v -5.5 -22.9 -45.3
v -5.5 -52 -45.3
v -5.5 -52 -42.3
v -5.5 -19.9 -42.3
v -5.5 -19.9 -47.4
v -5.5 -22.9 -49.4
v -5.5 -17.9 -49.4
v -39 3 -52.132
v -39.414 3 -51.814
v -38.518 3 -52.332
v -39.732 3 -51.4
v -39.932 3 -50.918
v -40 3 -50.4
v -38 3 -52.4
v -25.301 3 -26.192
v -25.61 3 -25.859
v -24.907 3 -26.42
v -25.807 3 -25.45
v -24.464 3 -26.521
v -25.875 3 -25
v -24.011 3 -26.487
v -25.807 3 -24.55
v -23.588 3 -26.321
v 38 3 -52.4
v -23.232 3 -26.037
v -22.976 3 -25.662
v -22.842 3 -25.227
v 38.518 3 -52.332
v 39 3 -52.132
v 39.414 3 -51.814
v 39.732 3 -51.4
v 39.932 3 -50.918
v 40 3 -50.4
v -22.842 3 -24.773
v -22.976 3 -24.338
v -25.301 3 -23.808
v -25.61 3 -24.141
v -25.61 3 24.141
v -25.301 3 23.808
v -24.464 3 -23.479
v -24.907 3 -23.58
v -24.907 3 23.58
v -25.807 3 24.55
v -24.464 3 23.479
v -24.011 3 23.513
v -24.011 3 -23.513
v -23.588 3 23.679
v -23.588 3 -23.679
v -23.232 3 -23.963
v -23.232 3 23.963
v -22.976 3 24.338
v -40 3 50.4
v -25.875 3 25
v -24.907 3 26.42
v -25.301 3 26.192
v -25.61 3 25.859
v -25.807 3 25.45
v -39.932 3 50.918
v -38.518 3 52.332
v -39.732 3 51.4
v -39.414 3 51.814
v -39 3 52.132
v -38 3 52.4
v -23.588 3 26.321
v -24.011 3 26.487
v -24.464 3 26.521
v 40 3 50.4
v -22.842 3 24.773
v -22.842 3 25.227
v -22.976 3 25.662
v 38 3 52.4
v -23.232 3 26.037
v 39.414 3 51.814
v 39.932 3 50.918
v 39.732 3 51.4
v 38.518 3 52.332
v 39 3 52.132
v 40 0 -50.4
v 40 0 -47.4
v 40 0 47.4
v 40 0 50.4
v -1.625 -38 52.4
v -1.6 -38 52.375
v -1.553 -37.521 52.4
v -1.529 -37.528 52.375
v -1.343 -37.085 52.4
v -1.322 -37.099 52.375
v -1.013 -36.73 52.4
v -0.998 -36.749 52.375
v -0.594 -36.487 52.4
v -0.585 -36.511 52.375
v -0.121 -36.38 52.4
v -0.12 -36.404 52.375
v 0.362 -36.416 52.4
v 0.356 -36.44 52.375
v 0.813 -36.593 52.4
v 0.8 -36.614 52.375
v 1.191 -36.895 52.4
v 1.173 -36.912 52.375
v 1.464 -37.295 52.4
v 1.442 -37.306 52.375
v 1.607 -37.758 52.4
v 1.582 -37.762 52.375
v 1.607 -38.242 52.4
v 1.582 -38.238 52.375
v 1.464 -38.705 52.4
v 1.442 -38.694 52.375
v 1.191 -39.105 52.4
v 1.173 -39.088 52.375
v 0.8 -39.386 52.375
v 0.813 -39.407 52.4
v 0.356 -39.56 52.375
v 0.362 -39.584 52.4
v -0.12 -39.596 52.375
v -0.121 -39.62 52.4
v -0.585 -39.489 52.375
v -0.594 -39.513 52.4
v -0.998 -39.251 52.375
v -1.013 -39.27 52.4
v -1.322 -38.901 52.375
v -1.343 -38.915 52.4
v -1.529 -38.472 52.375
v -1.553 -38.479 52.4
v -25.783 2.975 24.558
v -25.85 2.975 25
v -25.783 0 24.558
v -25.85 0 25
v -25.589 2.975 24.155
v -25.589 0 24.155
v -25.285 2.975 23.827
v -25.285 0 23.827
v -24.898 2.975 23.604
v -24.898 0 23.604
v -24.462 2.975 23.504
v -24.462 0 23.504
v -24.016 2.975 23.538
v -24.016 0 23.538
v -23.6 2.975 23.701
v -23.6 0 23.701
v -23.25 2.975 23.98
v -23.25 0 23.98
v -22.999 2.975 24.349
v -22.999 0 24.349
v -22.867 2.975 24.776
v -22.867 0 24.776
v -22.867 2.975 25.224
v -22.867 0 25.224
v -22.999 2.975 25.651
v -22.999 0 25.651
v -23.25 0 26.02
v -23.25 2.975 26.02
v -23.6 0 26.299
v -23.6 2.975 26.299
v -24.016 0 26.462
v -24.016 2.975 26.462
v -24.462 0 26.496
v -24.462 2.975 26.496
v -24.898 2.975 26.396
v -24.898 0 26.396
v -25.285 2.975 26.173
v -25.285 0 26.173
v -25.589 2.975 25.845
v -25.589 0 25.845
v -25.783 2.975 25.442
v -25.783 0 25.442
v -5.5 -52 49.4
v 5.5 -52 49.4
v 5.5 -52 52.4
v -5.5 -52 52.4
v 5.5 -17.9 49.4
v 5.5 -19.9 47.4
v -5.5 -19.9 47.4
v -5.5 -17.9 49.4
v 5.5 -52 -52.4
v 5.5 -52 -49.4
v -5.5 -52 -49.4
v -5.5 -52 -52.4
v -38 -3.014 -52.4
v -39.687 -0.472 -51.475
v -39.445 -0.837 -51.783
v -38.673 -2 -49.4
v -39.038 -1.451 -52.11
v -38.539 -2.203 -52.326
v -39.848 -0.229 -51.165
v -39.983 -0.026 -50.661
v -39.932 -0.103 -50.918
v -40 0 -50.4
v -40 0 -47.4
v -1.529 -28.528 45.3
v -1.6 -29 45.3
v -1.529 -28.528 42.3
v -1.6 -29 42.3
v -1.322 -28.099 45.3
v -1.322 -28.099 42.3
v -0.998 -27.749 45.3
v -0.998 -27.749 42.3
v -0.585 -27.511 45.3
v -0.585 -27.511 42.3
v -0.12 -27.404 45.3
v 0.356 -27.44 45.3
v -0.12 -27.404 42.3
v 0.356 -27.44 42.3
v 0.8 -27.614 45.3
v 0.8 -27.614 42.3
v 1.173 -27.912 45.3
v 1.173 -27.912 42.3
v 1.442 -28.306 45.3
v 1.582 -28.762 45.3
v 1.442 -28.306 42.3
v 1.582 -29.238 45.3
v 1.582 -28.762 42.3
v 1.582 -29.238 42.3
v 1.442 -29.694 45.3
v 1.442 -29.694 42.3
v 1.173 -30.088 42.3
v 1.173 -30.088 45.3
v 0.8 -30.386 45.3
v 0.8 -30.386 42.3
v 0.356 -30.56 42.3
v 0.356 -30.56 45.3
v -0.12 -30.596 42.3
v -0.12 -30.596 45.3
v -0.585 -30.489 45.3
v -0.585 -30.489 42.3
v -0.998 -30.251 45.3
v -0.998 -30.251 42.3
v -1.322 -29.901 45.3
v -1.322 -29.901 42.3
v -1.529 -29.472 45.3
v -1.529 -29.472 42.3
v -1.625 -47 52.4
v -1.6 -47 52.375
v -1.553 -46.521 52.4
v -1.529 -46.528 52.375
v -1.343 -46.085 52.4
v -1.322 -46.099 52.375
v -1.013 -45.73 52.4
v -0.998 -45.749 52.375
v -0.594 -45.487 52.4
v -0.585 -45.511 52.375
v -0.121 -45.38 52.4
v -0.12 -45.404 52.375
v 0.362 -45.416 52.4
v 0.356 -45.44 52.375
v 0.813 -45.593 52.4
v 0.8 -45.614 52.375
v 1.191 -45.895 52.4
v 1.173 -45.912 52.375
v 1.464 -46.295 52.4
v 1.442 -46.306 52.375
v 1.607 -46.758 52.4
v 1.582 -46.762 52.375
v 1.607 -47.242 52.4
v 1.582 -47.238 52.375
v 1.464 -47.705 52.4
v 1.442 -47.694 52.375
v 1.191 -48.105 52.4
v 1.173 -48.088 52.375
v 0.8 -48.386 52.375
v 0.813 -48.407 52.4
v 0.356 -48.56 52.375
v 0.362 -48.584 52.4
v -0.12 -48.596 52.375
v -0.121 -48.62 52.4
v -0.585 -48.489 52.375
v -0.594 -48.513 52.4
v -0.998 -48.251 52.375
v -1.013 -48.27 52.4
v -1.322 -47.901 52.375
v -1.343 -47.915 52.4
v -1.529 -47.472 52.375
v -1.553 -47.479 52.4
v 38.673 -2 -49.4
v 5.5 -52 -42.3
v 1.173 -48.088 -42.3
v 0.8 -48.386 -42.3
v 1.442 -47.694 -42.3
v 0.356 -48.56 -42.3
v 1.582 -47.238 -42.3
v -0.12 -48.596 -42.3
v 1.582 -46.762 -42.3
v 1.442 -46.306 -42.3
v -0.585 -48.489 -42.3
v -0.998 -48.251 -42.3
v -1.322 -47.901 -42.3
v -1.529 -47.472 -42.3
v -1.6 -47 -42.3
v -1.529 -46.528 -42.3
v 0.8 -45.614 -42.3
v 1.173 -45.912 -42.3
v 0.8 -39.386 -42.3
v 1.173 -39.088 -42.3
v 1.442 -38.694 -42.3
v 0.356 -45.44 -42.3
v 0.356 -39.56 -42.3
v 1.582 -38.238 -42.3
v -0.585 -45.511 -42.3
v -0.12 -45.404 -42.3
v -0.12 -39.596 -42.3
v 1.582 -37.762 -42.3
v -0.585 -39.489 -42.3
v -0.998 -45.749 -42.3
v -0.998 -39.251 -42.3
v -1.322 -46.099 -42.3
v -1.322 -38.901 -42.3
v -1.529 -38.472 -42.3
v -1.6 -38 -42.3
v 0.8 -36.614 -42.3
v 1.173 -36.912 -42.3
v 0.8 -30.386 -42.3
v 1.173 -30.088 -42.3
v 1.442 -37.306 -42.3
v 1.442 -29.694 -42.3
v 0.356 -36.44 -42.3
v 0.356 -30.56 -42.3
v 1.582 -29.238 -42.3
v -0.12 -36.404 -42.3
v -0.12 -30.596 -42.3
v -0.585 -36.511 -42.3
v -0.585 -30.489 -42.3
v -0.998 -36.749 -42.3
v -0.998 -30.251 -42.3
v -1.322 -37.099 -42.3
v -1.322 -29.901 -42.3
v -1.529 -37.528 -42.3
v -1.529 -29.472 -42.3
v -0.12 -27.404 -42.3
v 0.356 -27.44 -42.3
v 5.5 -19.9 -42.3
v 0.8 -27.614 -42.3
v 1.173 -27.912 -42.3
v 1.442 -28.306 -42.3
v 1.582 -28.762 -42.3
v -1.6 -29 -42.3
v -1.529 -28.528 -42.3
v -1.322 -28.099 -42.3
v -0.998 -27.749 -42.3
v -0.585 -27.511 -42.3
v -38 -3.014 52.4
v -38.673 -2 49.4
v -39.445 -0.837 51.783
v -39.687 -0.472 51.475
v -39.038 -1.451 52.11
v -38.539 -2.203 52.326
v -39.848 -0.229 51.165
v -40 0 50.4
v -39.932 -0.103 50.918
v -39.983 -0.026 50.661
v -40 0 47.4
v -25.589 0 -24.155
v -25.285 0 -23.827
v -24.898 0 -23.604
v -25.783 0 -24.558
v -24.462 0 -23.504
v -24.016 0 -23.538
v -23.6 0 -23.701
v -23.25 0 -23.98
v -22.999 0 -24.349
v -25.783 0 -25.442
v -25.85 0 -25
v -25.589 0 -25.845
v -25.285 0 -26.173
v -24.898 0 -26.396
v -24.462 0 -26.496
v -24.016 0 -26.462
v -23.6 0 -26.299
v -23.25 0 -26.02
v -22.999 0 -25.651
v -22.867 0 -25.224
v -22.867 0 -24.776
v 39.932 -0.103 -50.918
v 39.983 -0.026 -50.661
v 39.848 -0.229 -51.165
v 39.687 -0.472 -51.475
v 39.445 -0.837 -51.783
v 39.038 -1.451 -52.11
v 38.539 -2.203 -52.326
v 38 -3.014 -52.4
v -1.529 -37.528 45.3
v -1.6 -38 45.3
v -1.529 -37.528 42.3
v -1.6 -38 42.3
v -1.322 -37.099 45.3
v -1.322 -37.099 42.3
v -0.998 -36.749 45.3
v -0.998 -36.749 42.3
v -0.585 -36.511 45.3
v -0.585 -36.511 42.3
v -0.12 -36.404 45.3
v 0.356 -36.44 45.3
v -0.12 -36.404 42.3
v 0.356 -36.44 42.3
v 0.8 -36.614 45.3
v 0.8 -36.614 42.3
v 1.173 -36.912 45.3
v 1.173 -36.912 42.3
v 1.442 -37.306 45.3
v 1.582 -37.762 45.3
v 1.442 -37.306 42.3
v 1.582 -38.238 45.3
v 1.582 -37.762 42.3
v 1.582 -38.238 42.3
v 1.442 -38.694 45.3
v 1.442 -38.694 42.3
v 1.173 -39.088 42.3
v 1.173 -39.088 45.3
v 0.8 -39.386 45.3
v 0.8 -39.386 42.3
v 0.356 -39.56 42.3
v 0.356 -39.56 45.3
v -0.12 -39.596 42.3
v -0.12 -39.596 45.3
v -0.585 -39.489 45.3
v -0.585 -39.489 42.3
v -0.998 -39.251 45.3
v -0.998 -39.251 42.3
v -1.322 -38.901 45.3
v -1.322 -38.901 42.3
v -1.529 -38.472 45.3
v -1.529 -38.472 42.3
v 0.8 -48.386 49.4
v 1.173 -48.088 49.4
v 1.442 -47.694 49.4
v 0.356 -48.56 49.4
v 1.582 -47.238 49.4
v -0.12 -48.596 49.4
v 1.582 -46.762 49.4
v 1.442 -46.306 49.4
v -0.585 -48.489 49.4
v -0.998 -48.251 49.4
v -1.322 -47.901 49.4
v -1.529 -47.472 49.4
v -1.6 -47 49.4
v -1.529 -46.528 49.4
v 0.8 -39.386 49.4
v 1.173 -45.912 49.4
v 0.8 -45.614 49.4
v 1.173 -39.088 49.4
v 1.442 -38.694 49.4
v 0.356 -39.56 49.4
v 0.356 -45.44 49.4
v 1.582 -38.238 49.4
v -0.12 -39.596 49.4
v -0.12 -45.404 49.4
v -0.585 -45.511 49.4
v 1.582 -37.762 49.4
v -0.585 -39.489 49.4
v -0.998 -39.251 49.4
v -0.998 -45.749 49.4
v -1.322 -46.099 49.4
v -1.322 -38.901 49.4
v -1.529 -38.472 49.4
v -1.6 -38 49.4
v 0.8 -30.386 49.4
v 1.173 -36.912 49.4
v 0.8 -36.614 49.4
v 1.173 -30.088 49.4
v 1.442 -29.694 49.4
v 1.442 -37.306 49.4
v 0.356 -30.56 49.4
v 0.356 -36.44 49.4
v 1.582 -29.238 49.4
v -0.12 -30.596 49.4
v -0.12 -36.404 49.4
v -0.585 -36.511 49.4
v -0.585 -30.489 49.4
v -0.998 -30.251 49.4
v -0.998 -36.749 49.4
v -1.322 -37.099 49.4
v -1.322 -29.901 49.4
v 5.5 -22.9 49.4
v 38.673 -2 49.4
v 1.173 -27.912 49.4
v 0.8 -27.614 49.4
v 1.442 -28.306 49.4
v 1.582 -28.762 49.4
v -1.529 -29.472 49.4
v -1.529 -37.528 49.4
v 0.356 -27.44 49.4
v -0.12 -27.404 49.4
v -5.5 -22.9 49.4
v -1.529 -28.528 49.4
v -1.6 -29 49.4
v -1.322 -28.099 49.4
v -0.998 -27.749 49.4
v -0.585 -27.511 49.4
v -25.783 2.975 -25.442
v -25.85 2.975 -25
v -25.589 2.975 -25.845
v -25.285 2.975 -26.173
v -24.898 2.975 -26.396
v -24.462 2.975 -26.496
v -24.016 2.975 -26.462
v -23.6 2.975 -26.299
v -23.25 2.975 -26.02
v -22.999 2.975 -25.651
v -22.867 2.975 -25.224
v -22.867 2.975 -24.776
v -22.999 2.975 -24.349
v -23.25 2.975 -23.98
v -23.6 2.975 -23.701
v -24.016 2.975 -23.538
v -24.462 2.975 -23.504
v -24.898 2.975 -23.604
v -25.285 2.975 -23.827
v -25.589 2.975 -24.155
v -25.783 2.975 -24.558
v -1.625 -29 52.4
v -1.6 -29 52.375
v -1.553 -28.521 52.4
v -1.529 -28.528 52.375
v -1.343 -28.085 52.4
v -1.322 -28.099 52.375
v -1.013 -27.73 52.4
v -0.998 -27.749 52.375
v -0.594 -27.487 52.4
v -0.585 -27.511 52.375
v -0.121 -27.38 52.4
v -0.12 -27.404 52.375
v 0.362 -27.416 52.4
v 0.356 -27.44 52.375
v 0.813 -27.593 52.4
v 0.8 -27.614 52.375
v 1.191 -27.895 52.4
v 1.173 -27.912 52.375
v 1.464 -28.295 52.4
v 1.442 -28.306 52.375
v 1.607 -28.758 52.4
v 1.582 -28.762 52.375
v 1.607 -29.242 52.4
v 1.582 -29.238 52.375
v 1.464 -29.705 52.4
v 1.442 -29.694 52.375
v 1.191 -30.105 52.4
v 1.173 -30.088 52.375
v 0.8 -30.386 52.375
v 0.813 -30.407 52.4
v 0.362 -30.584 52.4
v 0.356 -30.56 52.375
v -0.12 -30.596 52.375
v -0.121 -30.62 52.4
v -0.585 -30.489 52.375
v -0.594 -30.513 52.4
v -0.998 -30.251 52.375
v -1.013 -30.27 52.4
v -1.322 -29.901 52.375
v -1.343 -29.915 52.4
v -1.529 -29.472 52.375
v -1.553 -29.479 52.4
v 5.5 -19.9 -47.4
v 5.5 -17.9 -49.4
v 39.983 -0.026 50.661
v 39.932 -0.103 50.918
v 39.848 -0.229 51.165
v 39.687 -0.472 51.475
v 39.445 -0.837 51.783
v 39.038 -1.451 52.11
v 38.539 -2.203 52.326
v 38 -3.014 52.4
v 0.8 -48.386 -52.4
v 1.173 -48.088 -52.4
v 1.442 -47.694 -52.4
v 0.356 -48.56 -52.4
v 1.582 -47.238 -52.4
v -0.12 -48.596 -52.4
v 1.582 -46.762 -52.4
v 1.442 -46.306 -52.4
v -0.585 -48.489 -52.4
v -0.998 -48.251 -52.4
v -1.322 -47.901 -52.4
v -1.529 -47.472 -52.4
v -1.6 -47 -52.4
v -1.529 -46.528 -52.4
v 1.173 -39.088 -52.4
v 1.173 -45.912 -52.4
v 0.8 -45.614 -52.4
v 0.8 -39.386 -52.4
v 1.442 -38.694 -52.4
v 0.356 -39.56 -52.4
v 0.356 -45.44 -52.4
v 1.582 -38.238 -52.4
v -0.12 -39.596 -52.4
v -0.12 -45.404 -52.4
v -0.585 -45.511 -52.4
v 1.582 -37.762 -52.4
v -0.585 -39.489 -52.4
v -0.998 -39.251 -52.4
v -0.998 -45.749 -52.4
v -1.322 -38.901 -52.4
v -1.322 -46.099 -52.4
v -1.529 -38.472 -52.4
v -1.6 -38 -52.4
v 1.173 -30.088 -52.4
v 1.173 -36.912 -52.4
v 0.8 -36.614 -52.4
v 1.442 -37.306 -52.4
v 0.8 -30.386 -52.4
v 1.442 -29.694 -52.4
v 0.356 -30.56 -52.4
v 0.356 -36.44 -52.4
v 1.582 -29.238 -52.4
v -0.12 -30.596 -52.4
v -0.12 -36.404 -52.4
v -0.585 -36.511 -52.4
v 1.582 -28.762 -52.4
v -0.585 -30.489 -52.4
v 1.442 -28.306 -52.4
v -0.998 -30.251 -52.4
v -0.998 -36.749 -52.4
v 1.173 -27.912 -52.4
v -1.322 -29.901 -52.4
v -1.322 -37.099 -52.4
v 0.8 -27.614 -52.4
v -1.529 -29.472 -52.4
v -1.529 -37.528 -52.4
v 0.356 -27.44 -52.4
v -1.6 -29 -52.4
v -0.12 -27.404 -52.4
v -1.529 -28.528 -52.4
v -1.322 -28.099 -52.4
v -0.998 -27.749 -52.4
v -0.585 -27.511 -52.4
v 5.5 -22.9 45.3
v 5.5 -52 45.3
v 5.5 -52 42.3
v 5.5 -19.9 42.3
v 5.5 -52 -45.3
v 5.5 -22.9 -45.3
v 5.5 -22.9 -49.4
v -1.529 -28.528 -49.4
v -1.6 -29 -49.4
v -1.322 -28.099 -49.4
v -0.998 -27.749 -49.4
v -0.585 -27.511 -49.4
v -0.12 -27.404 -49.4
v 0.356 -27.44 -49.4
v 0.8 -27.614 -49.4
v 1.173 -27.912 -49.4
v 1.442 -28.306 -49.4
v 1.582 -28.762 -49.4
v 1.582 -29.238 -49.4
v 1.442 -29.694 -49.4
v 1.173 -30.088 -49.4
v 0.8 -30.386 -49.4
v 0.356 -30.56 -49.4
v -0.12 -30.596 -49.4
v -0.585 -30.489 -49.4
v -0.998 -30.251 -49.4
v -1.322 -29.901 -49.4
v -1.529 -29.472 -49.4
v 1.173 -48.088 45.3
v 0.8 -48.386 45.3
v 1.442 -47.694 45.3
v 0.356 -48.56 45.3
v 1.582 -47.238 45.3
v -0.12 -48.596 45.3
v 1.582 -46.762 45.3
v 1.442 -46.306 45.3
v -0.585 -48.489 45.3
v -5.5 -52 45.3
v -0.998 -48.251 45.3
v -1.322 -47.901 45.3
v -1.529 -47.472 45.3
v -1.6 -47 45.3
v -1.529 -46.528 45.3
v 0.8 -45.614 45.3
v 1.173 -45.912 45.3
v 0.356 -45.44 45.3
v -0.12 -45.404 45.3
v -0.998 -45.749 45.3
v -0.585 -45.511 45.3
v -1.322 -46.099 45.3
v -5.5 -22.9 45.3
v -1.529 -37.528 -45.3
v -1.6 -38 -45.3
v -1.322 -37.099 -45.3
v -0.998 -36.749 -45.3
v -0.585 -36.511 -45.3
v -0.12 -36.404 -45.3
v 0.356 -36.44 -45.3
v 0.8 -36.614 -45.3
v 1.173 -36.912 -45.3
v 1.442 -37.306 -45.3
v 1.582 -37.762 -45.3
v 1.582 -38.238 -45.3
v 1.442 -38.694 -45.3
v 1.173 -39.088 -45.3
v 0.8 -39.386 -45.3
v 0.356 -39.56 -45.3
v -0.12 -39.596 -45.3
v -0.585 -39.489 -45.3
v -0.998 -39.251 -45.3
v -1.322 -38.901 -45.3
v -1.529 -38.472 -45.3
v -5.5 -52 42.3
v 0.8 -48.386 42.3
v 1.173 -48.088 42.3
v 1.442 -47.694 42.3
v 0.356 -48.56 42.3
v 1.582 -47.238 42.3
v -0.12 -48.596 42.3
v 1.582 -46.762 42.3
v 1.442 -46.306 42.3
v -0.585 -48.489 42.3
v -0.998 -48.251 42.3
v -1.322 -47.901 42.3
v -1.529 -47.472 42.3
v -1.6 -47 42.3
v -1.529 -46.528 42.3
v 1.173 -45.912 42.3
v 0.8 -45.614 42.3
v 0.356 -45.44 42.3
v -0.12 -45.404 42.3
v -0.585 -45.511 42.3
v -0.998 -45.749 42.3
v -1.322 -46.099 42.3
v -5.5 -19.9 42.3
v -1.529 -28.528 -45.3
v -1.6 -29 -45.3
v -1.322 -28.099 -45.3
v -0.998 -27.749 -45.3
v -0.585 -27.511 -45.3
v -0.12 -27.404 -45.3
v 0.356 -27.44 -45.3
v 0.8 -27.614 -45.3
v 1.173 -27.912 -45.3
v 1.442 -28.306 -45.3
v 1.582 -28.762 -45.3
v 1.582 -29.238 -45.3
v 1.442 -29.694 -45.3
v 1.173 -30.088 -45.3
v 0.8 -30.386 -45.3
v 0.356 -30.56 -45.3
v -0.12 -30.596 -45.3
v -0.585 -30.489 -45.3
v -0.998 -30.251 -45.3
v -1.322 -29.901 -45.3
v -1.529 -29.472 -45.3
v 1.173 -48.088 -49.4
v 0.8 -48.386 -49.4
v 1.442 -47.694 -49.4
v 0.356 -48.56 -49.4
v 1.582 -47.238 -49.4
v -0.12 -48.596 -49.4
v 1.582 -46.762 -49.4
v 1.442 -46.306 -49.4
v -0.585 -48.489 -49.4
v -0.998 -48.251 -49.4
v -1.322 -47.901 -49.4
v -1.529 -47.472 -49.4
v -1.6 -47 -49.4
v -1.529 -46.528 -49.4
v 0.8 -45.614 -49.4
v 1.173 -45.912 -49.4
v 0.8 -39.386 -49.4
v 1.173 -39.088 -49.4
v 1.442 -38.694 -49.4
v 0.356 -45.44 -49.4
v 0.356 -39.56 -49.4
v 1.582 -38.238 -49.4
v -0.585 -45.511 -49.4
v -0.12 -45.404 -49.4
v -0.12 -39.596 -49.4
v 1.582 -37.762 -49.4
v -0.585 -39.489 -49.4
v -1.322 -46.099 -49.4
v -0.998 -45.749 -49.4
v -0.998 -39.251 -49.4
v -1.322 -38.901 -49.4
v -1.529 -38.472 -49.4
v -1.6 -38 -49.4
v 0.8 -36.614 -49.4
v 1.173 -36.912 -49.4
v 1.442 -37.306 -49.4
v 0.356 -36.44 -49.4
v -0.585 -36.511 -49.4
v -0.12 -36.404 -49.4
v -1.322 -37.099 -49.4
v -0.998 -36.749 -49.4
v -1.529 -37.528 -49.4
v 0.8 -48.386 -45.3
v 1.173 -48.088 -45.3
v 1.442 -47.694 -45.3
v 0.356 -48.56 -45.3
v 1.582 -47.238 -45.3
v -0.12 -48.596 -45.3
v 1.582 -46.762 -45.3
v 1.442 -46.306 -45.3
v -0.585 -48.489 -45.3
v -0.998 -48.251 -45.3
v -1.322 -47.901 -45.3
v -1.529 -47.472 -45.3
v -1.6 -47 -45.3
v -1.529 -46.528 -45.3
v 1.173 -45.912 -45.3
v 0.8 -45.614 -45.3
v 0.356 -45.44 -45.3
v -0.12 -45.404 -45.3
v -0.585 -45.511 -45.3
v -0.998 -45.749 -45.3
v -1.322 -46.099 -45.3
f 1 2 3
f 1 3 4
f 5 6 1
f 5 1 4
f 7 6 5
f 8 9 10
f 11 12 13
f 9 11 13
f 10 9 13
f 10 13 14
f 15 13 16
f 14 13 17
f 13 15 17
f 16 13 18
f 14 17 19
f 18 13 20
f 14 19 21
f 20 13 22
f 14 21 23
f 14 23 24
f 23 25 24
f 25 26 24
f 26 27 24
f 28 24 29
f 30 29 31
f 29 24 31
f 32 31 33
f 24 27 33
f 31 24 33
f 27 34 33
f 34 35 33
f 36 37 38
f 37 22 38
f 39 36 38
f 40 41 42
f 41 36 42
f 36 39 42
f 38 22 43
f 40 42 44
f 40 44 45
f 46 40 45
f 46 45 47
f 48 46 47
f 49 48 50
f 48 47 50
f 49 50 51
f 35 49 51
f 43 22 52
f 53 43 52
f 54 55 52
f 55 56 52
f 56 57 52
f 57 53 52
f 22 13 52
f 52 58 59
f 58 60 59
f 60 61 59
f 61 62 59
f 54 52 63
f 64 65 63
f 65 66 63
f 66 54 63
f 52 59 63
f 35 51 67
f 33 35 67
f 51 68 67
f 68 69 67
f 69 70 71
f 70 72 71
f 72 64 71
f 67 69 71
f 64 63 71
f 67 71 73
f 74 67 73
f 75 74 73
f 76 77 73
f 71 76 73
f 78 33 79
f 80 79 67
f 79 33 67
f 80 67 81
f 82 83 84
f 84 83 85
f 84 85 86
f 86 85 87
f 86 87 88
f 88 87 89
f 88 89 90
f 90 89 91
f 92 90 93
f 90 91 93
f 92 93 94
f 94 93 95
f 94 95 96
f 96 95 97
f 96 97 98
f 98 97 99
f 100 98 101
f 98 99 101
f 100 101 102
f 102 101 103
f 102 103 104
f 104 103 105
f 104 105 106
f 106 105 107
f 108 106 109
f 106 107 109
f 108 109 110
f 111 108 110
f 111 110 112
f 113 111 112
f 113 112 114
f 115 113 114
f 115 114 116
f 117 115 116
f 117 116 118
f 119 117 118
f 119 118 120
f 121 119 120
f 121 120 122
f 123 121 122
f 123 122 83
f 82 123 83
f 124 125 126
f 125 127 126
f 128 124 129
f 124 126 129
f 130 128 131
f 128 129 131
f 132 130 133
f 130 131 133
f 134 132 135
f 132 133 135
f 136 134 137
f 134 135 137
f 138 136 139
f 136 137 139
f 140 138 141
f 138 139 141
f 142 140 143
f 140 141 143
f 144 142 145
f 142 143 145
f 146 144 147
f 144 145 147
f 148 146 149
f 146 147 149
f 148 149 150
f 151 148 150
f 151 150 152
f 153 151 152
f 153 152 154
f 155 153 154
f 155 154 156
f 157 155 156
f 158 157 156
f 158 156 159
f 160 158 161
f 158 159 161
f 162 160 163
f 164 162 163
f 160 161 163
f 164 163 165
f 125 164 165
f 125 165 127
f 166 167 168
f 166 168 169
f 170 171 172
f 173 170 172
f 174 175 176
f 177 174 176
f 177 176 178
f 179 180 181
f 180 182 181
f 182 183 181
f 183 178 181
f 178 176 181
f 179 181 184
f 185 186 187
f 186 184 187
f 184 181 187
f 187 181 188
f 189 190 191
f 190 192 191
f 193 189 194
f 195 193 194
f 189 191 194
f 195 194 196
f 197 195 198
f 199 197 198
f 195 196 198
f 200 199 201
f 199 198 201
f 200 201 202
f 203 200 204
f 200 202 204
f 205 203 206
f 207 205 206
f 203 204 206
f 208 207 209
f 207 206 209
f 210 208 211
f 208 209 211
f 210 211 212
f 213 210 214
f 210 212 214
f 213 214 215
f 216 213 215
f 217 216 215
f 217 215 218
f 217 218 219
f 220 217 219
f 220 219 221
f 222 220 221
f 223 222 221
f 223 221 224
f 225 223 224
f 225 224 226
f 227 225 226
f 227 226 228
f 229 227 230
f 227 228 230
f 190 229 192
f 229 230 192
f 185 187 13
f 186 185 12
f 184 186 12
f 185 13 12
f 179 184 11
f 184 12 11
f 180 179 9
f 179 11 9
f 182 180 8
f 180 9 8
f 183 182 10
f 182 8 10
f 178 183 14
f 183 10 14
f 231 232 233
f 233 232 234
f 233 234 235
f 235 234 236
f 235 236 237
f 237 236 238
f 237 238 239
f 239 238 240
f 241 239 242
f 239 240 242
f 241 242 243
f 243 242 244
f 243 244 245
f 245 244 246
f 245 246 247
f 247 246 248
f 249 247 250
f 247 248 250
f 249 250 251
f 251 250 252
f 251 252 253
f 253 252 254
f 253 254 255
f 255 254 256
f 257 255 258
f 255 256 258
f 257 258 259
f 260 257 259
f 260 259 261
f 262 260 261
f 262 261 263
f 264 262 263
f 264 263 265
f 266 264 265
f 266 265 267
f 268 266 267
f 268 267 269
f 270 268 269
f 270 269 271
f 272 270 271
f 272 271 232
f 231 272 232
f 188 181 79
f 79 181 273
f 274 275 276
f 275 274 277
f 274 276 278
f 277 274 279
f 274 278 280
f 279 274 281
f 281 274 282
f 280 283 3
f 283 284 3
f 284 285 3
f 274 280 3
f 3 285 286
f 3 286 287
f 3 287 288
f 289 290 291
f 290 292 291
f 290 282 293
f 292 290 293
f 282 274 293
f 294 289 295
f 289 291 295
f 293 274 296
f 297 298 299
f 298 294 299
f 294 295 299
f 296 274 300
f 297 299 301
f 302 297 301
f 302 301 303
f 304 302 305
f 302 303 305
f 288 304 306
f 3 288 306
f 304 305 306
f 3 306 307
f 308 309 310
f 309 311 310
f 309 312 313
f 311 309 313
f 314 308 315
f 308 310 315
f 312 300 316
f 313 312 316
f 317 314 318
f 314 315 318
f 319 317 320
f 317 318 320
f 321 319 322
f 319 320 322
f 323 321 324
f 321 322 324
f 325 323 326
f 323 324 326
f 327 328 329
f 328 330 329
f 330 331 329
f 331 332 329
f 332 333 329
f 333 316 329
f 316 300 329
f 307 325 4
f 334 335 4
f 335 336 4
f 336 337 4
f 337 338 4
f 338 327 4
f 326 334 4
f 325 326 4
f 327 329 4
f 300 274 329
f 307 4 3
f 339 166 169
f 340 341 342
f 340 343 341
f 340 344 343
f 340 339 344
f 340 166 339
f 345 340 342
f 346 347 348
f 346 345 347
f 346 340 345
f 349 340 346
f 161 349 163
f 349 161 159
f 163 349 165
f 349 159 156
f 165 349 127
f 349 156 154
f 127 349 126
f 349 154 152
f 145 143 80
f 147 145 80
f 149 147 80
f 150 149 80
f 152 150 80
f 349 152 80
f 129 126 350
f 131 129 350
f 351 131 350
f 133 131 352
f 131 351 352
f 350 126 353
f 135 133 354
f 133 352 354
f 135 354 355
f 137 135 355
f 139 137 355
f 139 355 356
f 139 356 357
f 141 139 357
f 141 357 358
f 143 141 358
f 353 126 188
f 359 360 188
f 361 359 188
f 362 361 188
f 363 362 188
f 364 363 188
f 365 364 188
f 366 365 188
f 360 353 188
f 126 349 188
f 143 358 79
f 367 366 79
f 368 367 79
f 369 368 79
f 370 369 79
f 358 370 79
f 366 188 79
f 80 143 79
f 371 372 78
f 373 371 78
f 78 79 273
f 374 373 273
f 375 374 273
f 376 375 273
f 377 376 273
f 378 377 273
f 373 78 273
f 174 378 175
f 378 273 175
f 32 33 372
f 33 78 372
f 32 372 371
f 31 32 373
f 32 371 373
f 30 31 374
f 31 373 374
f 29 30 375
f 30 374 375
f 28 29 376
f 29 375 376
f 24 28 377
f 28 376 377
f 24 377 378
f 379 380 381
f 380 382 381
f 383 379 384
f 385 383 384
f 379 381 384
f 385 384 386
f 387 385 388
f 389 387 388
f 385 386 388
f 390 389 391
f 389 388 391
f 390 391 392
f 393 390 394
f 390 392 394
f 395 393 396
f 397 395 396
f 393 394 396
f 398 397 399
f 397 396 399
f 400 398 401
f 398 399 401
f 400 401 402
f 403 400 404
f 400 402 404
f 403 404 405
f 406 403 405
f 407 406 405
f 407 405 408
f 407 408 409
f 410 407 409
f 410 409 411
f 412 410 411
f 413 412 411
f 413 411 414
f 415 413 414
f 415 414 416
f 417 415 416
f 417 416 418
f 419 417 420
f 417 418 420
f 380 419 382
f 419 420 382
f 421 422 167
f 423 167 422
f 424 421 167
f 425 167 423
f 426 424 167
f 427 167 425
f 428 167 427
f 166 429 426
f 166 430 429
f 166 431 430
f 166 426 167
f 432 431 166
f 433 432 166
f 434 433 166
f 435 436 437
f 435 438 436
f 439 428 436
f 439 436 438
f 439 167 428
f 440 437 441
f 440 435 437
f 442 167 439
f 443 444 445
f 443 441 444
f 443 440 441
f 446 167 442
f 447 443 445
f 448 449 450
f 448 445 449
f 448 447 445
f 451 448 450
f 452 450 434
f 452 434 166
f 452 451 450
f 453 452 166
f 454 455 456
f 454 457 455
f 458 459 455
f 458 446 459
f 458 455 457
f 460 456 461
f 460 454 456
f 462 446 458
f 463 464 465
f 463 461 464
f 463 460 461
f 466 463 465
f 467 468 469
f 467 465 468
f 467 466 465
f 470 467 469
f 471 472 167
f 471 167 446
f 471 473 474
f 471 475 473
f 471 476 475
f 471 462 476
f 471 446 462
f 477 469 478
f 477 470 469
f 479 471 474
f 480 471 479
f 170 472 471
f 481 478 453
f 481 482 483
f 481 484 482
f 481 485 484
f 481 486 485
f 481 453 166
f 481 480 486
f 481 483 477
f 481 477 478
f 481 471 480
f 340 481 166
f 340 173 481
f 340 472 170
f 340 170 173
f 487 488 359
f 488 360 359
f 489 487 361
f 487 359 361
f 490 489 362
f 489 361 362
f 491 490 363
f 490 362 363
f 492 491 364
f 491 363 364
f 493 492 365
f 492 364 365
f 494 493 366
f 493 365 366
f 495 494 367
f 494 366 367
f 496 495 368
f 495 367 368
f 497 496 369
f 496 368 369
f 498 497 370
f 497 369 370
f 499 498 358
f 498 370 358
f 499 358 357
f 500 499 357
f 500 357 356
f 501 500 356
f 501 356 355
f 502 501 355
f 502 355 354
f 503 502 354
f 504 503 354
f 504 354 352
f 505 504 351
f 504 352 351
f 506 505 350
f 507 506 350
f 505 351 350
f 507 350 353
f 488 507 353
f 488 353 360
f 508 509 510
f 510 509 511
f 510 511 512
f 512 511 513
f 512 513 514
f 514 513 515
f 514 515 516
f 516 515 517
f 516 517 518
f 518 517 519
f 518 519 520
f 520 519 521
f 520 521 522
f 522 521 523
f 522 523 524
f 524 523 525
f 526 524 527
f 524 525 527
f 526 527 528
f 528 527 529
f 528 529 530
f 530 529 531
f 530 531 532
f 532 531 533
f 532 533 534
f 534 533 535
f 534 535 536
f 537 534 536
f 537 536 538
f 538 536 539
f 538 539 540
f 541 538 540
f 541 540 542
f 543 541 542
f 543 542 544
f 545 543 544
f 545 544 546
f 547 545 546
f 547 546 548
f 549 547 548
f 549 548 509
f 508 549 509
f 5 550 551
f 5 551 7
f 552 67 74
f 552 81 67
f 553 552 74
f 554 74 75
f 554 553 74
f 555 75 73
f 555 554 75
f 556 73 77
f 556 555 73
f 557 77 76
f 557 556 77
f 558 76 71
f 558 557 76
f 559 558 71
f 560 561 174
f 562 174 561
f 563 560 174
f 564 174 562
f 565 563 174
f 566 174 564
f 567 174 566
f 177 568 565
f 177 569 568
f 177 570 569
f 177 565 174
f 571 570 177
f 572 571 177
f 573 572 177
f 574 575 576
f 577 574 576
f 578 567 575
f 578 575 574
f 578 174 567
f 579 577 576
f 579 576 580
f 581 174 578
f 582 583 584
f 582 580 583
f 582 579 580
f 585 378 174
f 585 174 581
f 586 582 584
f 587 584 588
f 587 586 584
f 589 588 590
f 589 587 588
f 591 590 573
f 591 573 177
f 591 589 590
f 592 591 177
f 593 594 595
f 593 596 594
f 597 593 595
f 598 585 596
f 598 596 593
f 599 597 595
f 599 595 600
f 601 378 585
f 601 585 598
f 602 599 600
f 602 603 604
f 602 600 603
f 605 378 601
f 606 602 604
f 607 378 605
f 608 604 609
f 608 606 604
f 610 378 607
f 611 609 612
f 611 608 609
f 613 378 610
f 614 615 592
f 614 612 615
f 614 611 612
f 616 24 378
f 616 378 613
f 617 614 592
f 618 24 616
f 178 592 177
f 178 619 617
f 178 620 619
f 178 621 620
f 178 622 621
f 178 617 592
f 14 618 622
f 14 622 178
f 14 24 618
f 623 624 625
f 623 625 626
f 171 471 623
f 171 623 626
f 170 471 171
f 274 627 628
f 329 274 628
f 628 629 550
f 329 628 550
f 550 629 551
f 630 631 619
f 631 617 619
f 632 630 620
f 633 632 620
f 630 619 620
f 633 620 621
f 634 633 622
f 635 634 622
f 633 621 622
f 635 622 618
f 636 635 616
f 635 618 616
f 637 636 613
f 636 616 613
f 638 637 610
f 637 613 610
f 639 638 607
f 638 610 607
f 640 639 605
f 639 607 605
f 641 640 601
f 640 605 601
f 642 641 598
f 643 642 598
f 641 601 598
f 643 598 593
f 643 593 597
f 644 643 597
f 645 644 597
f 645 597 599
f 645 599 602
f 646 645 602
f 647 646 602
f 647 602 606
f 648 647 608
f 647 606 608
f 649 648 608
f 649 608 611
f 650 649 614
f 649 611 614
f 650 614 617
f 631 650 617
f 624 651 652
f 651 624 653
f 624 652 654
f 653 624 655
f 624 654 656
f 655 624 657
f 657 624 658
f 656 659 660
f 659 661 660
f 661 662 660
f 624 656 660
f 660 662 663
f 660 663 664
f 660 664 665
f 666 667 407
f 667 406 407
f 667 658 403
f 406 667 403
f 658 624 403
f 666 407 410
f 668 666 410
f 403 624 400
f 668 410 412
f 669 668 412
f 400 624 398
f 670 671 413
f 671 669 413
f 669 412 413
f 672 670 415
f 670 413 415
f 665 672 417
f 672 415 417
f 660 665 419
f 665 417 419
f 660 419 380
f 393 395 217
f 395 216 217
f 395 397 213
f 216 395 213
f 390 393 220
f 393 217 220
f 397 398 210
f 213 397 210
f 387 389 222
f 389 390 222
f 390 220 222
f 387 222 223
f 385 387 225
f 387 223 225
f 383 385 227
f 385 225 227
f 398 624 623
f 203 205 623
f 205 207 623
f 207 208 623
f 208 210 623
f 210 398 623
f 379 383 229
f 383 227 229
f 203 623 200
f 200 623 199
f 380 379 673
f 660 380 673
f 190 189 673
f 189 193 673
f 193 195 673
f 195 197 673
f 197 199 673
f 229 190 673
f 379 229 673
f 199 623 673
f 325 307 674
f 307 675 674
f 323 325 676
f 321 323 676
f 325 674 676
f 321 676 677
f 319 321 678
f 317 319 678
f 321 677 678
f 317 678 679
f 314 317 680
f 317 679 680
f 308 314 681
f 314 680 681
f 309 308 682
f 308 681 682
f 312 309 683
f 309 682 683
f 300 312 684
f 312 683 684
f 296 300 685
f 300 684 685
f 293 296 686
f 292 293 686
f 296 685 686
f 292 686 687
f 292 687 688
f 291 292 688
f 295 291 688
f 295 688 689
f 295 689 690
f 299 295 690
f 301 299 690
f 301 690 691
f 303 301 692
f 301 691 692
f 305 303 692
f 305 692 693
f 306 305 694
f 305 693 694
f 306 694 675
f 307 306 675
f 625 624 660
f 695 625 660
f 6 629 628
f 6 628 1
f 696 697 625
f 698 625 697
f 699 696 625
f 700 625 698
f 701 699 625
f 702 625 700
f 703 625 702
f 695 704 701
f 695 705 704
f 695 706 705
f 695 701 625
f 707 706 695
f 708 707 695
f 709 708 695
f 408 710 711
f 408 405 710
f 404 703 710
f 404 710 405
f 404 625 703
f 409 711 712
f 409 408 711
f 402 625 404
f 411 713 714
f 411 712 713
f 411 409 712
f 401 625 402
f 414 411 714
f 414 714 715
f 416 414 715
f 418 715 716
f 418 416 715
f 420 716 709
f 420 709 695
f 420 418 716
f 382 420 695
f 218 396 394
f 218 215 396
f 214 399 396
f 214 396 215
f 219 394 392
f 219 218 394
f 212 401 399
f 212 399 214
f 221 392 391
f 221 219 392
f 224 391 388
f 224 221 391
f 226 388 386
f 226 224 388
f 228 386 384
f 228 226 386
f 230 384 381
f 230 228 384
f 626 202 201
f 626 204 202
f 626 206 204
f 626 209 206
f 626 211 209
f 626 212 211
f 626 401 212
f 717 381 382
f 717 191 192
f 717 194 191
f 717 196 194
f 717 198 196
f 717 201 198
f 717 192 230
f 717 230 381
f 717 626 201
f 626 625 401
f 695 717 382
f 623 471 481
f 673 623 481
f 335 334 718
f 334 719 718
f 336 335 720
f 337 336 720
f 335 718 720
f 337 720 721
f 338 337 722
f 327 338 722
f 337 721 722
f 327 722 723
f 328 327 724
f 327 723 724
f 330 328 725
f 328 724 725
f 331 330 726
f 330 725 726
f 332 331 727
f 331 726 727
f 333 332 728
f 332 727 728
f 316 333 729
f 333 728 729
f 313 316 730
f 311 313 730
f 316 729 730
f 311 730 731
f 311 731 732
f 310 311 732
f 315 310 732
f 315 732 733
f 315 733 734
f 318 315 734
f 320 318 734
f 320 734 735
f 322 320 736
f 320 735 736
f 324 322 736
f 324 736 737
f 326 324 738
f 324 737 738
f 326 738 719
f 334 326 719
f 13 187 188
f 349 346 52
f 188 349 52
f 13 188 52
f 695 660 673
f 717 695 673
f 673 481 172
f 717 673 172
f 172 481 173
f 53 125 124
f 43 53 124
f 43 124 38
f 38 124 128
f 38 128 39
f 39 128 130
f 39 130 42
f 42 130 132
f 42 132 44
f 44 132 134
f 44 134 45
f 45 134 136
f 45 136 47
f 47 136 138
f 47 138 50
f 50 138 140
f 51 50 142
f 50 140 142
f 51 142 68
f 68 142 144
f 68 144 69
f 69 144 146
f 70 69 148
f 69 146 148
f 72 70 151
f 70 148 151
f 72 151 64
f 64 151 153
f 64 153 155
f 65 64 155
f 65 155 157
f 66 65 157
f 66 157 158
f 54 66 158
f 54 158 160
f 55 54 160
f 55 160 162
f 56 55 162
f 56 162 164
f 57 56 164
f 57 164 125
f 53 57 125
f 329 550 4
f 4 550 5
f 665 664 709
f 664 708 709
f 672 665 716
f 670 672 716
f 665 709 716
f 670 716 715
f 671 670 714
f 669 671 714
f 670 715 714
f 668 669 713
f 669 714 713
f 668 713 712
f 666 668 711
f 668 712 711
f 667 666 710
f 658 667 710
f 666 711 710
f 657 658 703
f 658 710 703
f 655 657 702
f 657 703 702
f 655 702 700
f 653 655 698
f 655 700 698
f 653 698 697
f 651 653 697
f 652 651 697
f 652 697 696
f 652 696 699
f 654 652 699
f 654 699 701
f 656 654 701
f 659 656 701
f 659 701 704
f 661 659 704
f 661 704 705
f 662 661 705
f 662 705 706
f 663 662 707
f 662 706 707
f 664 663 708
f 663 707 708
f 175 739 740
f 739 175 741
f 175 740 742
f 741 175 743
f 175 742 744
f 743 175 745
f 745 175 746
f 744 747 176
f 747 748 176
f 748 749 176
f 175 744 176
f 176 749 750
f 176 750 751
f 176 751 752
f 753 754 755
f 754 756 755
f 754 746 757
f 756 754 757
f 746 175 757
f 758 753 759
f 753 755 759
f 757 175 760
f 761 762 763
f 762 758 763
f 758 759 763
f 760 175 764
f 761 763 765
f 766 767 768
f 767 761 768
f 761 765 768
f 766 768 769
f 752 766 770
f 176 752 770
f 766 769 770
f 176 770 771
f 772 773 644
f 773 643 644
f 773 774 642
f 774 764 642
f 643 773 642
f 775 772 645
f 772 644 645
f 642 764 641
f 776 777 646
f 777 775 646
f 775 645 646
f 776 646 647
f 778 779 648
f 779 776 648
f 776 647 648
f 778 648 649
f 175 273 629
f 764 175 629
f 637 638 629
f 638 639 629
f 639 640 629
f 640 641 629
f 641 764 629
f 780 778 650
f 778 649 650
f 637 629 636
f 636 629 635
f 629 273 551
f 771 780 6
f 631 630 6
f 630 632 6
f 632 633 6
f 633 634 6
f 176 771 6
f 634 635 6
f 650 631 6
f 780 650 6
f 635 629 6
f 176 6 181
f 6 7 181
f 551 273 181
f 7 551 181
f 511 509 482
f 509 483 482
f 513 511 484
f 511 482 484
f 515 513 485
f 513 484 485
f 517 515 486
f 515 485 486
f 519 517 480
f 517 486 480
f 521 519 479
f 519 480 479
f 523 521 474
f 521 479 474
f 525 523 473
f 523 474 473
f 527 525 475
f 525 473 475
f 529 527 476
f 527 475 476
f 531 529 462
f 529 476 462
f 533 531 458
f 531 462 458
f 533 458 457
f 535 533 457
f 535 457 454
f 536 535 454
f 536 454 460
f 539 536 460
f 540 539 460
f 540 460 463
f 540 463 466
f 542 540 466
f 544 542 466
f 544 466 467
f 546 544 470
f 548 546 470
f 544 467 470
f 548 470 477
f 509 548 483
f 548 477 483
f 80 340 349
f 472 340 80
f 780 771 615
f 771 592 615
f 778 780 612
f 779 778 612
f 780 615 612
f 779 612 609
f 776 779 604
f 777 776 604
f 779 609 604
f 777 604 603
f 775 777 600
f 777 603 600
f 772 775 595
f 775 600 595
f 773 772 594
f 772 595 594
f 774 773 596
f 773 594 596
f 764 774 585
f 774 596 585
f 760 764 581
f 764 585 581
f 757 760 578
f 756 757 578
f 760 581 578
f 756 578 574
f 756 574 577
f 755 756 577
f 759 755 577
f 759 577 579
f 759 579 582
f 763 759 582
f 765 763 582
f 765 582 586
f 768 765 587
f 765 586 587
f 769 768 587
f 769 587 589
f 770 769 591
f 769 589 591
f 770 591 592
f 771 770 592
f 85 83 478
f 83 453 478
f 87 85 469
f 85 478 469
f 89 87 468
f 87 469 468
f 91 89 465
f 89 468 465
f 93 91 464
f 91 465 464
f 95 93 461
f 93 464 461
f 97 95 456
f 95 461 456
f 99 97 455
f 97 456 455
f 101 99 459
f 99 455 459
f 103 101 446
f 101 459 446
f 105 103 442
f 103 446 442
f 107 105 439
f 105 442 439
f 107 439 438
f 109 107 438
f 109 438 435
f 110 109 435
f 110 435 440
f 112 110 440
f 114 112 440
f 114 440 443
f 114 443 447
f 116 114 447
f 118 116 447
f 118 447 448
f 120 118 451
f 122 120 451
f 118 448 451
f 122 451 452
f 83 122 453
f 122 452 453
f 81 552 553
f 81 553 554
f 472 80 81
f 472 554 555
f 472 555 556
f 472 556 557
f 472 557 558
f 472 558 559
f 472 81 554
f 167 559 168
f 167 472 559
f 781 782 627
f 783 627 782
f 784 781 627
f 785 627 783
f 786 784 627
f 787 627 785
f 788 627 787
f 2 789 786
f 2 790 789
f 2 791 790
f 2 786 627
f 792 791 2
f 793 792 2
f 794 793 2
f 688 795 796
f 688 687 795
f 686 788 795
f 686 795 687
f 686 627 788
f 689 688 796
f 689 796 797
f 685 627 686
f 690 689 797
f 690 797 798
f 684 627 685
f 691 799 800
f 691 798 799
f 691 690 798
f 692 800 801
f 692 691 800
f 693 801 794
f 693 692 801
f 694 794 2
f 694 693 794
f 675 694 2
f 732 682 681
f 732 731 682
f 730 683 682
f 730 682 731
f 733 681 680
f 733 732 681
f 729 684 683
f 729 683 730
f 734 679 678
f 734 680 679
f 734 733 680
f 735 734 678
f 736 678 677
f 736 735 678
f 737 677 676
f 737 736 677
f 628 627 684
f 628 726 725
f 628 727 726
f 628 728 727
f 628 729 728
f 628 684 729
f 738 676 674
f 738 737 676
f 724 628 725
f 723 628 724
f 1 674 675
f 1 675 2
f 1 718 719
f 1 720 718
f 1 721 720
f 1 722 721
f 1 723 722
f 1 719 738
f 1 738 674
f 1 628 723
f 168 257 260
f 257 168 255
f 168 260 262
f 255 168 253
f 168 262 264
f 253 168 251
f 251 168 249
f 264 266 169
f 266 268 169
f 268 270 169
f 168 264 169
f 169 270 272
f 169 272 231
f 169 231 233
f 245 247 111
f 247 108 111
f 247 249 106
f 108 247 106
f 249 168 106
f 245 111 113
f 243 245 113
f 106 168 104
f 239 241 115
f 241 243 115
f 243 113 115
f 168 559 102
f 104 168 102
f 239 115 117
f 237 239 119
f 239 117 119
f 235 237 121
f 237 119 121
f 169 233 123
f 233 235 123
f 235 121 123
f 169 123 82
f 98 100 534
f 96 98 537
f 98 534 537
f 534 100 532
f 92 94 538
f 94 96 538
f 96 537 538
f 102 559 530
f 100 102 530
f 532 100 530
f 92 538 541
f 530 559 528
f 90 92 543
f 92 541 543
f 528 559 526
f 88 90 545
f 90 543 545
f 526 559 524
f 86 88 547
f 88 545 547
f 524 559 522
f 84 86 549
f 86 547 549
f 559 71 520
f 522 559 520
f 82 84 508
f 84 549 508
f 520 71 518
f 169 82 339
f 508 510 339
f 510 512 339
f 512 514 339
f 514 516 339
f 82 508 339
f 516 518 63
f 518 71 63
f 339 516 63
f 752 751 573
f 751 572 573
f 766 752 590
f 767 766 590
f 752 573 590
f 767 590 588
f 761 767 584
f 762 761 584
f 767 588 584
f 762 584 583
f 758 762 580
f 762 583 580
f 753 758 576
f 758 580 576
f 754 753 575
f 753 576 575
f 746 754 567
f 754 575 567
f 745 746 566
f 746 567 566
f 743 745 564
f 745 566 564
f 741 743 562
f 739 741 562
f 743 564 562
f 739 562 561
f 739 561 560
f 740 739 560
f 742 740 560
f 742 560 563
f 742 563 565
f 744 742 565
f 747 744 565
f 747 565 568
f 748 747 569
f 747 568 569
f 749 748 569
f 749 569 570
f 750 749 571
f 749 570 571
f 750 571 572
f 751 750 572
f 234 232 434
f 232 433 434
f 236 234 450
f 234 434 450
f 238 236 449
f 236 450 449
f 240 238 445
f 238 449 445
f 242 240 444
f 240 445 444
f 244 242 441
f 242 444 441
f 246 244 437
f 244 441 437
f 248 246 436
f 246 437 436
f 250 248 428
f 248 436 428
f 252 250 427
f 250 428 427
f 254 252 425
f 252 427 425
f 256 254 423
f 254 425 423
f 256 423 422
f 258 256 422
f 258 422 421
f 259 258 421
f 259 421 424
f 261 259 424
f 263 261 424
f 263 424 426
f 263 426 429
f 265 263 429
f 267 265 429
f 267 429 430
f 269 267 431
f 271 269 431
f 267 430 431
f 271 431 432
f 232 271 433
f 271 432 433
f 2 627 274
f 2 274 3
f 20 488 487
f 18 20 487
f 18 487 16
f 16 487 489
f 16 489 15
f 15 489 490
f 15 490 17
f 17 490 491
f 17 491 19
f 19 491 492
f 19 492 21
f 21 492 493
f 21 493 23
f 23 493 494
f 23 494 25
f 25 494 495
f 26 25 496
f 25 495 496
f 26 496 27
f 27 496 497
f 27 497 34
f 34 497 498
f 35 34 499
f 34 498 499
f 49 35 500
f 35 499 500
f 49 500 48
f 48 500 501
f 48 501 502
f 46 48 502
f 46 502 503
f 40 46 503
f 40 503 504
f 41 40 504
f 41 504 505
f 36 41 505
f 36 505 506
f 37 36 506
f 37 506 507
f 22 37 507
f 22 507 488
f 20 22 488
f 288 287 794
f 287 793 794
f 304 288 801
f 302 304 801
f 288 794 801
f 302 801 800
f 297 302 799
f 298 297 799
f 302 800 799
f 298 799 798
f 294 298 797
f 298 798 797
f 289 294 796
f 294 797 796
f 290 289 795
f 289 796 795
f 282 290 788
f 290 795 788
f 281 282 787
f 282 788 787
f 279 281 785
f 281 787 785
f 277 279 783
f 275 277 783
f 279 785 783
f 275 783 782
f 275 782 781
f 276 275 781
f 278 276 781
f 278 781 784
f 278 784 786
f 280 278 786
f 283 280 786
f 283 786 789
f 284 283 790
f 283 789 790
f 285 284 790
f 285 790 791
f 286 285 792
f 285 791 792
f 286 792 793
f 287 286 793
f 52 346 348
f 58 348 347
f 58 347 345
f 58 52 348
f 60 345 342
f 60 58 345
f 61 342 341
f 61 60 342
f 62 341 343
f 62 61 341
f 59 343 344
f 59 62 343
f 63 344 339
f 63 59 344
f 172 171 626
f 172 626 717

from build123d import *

# Parameters (mm, degrees)
SKETCH1_W                       = 80
SKETCH1_H                       = 98.8
BOSS_EXTRUDE1_DEPTH             = 3
BOSS_EXTRUDE2_DEPTH             = 3
CHAMFER2_SIZE                   = 2
FILLET1_R                       = 2
SKETCH4_W                       = 11
SKETCH4_H                       = 3
BOSS_EXTRUDE3_DEPTH             = 4.1
SKETCH6_W                       = 11
SKETCH6_H                       = 32.1
BOSS_EXTRUDE4_DEPTH             = 3
CHAMFER3_SIZE                   = 2
F_3_0MM_DOWEL_HOLE1_D           = 3.2
F_3_0MM_DOWEL_HOLE1_CSINK_D     = 3.25
F_3_0MM_DOWEL_HOLE1_CSINK_ANGLE = 90
F_3_0MM_DOWEL_HOLE2_D           = 3
F_3_0MM_DOWEL_HOLE2_DEPTH       = 20
F_3_0MM_DOWEL_HOLE2_CSINK_D     = 3.05
F_3_0MM_DOWEL_HOLE2_CSINK_ANGLE = 90
F_3_0MM_DOWEL_HOLE2_TIP         = 0.901290929


with BuildPart() as part:
    # Sketch1 → Boss-Extrude1 (new body)
    with BuildSketch(Plane(origin=(0, 0, 0), x_dir=(1, 0, 0), z_dir=(0, 1, 0))):
        Rectangle(SKETCH1_W, SKETCH1_H)
    extrude(amount=BOSS_EXTRUDE1_DEPTH)

    # Sketch3 → Boss-Extrude2 (add)
    with BuildSketch(Plane.XY.offset(49.4)):
        Polygon((-40, 0), (-40, 3), (40, 3), (40, 0), (5.5, -52), (-5.5, -52), align=None)
    boss_extrude2 = extrude(amount=BOSS_EXTRUDE2_DEPTH)

    # Mirror1: Boss-Extrude2 across plane
    add(boss_extrude2.mirror(Plane.XY))

    # Chamfer2
    chamfer2_edges = [part.edges().sort_by_distance(p)[0] for p in [
        (0, 0, 49.4),
        (0, 0, -49.4),
    ]]
    chamfer(chamfer2_edges, length=CHAMFER2_SIZE)

    # Fillet1
    fillet1_edges = [part.edges().sort_by_distance(p)[0] for p in [
        (40, 1.5, 52.4),
        (-40, 1.5, 52.4),
        (-40, 1.5, -52.4),
        (40, 1.5, -52.4),
    ]]
    fillet(fillet1_edges, radius=FILLET1_R)

    # Sketch4 → Boss-Extrude3 (add)
    with BuildSketch(Plane(origin=(0, 0, 49.4), x_dir=(-1, 0, 0), z_dir=(0, 0, -1))):
        with Locations((0, -21.4)):
            Rectangle(SKETCH4_W, SKETCH4_H)
    boss_extrude3 = extrude(amount=BOSS_EXTRUDE3_DEPTH)

    # Sketch6 → Boss-Extrude4 (add)
    with BuildSketch(Plane(origin=(0, 0, 45.3), x_dir=(-1, 0, 0), z_dir=(0, 0, -1))):
        with Locations((0, -35.95)):
            Rectangle(SKETCH6_W, SKETCH6_H)
    boss_extrude4 = extrude(amount=BOSS_EXTRUDE4_DEPTH)

    # Mirror4: Boss-Extrude3, Boss-Extrude4 across plane
    add(boss_extrude3.mirror(Plane.XY))
    add(boss_extrude4.mirror(Plane.XY))

    # Chamfer3
    chamfer3_edges = [part.edges().sort_by_distance(p)[0] for p in [
        (0, -19.9, 49.4),
        (0, -19.9, -49.4),
    ]]
    chamfer(chamfer3_edges, length=CHAMFER3_SIZE)

    # Ø3.0mm Dowel Hole1 (through all)
    with Locations(Plane.XY.offset(52.4)):
        with Locations((0, -47), (0, -38), (0, -29)):
            CounterSinkHole(F_3_0MM_DOWEL_HOLE1_D / 2, F_3_0MM_DOWEL_HOLE1_CSINK_D / 2, counter_sink_angle=F_3_0MM_DOWEL_HOLE1_CSINK_ANGLE)

    # Ø3.0mm Dowel Hole2
    with Locations(Plane(origin=(0, 3, 0), x_dir=(1, 0, 0), z_dir=(0, 1, 0))):
        with Locations((-24.35, 25), (-24.35, -25)):
            CounterSinkHole(F_3_0MM_DOWEL_HOLE2_D / 2, F_3_0MM_DOWEL_HOLE2_CSINK_D / 2, depth=F_3_0MM_DOWEL_HOLE2_DEPTH, counter_sink_angle=F_3_0MM_DOWEL_HOLE2_CSINK_ANGLE)
            with Locations((0, 0, -(F_3_0MM_DOWEL_HOLE2_DEPTH + F_3_0MM_DOWEL_HOLE2_TIP / 2))):  # 118° drill point
                Cone(0, F_3_0MM_DOWEL_HOLE2_D / 2, F_3_0MM_DOWEL_HOLE2_TIP, mode=Mode.SUBTRACT)


solid = part.part
